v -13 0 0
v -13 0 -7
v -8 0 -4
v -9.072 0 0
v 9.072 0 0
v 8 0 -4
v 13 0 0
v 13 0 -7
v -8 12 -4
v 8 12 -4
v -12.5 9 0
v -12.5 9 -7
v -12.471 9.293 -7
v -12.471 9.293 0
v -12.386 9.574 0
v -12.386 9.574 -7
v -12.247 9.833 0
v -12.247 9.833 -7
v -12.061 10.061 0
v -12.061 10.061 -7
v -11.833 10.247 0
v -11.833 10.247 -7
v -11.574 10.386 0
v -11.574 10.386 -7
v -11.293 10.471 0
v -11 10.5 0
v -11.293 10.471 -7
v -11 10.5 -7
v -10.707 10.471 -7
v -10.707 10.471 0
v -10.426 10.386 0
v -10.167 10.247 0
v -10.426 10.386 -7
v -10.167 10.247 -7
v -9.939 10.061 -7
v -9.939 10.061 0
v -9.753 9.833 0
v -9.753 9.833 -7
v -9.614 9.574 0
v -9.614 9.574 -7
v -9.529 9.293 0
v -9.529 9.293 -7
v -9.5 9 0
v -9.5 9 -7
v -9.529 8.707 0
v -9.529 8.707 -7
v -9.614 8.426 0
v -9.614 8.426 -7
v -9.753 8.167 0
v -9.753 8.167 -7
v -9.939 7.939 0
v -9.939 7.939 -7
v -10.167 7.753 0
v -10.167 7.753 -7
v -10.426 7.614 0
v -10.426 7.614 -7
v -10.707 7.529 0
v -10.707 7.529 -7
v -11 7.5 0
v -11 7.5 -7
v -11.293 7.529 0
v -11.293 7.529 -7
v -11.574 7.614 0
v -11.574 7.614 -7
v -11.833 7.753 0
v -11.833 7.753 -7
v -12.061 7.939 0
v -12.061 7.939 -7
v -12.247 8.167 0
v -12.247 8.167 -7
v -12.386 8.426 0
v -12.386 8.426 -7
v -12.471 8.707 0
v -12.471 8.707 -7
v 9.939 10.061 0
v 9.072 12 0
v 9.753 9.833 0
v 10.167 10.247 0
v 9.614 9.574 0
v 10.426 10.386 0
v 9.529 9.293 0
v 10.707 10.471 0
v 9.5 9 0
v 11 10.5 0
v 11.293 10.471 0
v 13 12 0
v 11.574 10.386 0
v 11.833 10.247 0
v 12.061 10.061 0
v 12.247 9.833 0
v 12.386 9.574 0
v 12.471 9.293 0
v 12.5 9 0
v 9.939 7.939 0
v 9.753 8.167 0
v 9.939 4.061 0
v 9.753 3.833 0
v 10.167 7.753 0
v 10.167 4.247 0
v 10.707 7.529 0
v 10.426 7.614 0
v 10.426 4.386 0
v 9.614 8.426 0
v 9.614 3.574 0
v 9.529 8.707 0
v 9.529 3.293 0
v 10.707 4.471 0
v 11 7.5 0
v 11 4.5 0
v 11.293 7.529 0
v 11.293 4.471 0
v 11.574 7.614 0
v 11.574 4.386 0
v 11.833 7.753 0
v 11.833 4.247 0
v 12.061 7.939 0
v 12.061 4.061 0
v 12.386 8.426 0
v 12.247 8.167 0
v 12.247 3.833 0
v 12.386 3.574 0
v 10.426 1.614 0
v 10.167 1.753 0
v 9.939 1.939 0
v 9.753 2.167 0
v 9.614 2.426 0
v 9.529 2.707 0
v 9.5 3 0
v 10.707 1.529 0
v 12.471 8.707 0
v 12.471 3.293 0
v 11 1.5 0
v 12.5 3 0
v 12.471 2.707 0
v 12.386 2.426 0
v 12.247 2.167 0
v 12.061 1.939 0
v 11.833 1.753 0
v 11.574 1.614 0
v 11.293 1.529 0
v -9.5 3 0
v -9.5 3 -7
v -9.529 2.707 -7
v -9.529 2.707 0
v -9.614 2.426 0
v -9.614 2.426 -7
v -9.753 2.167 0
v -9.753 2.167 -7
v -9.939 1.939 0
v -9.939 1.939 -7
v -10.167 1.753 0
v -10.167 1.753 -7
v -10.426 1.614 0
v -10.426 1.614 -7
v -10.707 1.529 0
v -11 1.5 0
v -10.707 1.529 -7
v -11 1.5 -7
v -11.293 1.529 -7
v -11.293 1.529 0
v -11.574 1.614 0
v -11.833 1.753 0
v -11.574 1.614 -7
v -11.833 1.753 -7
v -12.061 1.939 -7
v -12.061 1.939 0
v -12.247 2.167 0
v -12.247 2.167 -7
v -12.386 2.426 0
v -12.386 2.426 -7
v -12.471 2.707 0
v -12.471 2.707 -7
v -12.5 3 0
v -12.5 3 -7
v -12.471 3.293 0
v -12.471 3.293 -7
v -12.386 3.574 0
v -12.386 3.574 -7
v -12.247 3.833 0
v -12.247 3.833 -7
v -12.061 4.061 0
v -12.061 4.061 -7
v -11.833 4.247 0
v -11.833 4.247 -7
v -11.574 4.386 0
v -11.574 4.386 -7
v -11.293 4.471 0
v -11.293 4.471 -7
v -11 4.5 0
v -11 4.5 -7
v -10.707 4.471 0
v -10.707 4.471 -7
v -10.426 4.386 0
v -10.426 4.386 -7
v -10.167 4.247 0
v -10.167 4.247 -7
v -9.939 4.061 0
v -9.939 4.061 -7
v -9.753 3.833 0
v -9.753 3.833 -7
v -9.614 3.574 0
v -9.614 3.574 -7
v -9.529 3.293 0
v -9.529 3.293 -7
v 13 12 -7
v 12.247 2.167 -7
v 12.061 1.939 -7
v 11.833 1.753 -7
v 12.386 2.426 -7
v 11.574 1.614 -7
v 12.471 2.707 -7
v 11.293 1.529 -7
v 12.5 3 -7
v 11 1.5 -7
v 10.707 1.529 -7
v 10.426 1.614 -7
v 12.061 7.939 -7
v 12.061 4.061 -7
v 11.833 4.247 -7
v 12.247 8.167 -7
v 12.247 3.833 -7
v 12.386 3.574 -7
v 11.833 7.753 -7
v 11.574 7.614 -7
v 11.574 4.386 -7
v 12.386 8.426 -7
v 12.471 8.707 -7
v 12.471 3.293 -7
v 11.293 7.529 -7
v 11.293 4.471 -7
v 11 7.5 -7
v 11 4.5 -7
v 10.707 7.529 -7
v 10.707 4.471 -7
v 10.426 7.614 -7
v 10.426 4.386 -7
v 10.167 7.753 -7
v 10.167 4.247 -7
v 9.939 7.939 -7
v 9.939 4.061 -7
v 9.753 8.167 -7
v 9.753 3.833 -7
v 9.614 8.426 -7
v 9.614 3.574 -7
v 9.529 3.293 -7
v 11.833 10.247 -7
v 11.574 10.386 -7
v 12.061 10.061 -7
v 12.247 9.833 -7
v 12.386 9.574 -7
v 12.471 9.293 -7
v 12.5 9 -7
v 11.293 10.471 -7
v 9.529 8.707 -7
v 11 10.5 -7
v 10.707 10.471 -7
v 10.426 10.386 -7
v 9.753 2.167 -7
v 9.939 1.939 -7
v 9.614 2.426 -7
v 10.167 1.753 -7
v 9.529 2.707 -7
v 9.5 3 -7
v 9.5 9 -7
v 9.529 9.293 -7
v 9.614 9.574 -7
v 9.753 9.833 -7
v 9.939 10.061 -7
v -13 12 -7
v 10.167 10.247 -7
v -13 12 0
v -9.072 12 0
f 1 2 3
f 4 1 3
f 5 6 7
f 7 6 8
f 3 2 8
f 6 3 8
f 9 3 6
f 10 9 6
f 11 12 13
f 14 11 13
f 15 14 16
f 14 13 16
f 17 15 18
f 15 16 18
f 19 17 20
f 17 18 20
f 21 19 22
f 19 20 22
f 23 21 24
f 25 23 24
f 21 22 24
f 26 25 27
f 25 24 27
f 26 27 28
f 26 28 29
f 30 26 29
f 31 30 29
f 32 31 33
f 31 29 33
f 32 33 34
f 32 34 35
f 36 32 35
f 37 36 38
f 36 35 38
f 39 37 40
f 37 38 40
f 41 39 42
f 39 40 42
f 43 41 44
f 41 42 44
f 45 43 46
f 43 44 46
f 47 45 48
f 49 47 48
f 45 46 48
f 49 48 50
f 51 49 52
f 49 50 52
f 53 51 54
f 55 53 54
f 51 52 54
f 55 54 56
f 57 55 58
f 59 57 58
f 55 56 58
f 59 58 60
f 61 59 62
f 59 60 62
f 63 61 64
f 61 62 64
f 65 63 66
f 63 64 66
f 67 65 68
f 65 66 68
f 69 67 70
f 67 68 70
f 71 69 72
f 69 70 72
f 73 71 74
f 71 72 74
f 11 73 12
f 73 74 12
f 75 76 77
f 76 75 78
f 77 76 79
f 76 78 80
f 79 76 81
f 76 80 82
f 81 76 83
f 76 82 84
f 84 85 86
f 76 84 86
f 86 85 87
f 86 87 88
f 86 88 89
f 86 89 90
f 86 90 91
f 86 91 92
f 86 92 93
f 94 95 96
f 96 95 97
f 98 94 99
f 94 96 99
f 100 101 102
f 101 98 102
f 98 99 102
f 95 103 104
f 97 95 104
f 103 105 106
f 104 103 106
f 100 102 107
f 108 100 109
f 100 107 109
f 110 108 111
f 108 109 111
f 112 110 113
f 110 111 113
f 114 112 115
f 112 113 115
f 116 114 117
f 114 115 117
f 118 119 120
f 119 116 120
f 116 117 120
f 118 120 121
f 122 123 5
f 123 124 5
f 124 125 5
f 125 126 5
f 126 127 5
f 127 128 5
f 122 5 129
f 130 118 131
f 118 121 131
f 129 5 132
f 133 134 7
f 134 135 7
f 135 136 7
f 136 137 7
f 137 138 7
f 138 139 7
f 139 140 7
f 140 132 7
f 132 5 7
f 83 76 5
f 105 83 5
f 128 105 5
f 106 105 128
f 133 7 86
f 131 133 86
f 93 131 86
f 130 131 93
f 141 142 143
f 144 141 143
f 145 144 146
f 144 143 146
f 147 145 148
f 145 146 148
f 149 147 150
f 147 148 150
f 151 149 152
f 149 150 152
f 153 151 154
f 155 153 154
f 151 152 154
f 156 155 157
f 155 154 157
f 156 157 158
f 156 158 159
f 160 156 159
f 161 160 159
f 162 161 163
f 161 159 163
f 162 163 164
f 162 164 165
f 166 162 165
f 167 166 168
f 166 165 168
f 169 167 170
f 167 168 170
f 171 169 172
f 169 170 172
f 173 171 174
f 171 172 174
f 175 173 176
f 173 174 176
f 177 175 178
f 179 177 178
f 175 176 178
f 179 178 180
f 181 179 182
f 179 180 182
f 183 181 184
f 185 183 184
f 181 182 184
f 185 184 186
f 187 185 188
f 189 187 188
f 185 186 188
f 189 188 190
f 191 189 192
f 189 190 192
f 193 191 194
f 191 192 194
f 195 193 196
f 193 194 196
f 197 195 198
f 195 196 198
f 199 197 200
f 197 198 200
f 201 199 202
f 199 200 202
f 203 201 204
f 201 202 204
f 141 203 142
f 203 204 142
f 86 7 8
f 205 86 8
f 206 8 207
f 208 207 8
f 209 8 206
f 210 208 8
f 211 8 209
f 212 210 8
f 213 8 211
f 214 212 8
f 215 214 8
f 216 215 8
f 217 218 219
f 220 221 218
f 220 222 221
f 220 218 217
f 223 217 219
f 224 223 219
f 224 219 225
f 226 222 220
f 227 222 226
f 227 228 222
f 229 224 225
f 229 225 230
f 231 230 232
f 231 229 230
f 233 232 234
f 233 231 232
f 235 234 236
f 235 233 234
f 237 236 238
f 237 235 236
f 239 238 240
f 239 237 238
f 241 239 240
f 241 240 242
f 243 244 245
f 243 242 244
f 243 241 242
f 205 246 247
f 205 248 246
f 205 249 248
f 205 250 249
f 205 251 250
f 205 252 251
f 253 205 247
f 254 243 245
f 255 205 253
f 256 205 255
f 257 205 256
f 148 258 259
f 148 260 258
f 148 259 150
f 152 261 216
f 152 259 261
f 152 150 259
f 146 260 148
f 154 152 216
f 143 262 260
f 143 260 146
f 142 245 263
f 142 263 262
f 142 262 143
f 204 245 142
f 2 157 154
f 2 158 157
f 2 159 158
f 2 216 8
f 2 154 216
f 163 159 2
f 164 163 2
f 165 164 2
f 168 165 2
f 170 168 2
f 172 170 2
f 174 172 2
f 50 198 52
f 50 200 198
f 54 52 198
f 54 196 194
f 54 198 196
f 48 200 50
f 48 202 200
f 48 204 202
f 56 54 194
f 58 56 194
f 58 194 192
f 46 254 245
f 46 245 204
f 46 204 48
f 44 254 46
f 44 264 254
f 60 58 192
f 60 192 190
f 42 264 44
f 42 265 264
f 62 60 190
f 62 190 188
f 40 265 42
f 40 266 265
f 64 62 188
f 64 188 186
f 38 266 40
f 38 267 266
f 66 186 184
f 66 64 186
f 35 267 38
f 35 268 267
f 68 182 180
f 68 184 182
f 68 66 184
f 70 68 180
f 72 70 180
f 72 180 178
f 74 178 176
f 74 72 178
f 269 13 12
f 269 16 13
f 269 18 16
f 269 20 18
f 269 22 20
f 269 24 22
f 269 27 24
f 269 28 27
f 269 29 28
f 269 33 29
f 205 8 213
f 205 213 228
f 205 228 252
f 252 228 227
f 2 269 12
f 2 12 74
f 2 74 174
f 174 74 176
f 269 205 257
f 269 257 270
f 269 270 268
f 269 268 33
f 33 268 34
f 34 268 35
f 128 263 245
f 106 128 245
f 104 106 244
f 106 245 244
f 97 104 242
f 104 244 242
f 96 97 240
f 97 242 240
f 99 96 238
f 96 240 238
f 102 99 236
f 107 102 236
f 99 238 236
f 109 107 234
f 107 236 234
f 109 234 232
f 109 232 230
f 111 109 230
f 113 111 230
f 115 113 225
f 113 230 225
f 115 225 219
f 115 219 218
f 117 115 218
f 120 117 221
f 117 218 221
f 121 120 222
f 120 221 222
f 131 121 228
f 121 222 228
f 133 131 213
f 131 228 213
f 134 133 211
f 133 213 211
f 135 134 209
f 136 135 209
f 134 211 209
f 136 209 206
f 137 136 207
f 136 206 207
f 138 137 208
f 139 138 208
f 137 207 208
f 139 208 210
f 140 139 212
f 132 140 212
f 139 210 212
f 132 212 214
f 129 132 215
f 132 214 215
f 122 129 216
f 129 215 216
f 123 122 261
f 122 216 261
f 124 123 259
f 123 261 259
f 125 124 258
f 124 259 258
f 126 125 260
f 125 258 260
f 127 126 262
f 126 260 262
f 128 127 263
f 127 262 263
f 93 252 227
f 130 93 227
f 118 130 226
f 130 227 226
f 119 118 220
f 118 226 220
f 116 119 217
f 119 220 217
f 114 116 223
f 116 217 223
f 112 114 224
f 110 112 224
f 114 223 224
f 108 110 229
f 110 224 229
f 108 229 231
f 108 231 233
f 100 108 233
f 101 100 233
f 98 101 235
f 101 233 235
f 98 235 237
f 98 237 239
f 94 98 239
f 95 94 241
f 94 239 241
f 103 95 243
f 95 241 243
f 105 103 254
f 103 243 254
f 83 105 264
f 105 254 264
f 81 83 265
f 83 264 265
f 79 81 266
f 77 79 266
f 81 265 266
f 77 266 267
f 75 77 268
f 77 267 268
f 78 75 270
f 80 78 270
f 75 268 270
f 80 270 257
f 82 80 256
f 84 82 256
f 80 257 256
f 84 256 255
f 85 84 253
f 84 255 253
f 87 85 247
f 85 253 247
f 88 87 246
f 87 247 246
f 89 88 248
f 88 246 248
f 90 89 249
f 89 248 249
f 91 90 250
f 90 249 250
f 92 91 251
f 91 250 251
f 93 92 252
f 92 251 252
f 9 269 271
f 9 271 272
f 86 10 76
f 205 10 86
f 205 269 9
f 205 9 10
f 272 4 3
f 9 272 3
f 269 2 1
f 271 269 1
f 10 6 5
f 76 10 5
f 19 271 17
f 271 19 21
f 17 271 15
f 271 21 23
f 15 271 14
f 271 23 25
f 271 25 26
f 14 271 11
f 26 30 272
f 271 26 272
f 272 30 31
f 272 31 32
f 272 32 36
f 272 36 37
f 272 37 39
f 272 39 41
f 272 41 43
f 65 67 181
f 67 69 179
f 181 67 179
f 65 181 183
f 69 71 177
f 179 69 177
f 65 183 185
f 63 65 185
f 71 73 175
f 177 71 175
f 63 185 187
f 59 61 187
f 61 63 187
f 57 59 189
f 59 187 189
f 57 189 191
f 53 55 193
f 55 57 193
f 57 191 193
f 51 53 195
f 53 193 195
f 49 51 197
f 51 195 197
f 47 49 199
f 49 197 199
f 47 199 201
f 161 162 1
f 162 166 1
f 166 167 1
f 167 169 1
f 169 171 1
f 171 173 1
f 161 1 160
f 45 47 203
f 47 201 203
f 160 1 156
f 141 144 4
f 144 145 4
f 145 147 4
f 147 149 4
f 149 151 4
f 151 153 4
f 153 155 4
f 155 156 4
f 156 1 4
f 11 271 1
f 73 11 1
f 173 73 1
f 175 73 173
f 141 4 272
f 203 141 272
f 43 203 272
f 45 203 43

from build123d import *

# Parameters (mm, degrees)
EXTRUDE_1_DEPTH     = 12
SKETCH_3_W          = 26
SKETCH_3_H          = 12
CUT_EXTRUDE_1_DEPTH = 2
SKETCH_4_R          = 1.5
CUT_EXTRUDE_2_DEPTH = 7


with BuildPart() as part:
    # 草图2 → 凸台-拉伸1 (new body)
    with BuildSketch(Plane(origin=(0, 0, 0), x_dir=(1, 0, 0), z_dir=(0, 1, 0))):
        Polygon((-13, 0), (-9.07179677, 0), (-8, 4), (8, 4), (9.07179677, 0), (13, 0), (13, 9), (-13, 9), align=None)
    extrude(amount=EXTRUDE_1_DEPTH)

    # 草图3 → 切除-拉伸1 (cut)
    with BuildSketch(Plane(origin=(0, 0, -9), x_dir=(-1, 0, 0), z_dir=(0, 0, -1))):
        with Locations((0, 6)):
            Rectangle(SKETCH_3_W, SKETCH_3_H)
    extrude(amount=-CUT_EXTRUDE_1_DEPTH, mode=Mode.SUBTRACT)

    # 草图4 → 切除-拉伸2 (cut)
    with BuildSketch(Plane(origin=(0, 0, -7), x_dir=(-1, 0, 0), z_dir=(0, 0, -1))):
        with Locations((-11, 3)):
            Circle(SKETCH_4_R)
        with Locations(Location((11, 3, 0), (0, 0, 180))):
            Circle(SKETCH_4_R)
        with Locations((11, 9)):
            Circle(SKETCH_4_R)
        with Locations(Location((-11, 9, 0), (0, 0, 180))):
            Circle(SKETCH_4_R)
    extrude(amount=-CUT_EXTRUDE_2_DEPTH, mode=Mode.SUBTRACT)


solid = part.part
